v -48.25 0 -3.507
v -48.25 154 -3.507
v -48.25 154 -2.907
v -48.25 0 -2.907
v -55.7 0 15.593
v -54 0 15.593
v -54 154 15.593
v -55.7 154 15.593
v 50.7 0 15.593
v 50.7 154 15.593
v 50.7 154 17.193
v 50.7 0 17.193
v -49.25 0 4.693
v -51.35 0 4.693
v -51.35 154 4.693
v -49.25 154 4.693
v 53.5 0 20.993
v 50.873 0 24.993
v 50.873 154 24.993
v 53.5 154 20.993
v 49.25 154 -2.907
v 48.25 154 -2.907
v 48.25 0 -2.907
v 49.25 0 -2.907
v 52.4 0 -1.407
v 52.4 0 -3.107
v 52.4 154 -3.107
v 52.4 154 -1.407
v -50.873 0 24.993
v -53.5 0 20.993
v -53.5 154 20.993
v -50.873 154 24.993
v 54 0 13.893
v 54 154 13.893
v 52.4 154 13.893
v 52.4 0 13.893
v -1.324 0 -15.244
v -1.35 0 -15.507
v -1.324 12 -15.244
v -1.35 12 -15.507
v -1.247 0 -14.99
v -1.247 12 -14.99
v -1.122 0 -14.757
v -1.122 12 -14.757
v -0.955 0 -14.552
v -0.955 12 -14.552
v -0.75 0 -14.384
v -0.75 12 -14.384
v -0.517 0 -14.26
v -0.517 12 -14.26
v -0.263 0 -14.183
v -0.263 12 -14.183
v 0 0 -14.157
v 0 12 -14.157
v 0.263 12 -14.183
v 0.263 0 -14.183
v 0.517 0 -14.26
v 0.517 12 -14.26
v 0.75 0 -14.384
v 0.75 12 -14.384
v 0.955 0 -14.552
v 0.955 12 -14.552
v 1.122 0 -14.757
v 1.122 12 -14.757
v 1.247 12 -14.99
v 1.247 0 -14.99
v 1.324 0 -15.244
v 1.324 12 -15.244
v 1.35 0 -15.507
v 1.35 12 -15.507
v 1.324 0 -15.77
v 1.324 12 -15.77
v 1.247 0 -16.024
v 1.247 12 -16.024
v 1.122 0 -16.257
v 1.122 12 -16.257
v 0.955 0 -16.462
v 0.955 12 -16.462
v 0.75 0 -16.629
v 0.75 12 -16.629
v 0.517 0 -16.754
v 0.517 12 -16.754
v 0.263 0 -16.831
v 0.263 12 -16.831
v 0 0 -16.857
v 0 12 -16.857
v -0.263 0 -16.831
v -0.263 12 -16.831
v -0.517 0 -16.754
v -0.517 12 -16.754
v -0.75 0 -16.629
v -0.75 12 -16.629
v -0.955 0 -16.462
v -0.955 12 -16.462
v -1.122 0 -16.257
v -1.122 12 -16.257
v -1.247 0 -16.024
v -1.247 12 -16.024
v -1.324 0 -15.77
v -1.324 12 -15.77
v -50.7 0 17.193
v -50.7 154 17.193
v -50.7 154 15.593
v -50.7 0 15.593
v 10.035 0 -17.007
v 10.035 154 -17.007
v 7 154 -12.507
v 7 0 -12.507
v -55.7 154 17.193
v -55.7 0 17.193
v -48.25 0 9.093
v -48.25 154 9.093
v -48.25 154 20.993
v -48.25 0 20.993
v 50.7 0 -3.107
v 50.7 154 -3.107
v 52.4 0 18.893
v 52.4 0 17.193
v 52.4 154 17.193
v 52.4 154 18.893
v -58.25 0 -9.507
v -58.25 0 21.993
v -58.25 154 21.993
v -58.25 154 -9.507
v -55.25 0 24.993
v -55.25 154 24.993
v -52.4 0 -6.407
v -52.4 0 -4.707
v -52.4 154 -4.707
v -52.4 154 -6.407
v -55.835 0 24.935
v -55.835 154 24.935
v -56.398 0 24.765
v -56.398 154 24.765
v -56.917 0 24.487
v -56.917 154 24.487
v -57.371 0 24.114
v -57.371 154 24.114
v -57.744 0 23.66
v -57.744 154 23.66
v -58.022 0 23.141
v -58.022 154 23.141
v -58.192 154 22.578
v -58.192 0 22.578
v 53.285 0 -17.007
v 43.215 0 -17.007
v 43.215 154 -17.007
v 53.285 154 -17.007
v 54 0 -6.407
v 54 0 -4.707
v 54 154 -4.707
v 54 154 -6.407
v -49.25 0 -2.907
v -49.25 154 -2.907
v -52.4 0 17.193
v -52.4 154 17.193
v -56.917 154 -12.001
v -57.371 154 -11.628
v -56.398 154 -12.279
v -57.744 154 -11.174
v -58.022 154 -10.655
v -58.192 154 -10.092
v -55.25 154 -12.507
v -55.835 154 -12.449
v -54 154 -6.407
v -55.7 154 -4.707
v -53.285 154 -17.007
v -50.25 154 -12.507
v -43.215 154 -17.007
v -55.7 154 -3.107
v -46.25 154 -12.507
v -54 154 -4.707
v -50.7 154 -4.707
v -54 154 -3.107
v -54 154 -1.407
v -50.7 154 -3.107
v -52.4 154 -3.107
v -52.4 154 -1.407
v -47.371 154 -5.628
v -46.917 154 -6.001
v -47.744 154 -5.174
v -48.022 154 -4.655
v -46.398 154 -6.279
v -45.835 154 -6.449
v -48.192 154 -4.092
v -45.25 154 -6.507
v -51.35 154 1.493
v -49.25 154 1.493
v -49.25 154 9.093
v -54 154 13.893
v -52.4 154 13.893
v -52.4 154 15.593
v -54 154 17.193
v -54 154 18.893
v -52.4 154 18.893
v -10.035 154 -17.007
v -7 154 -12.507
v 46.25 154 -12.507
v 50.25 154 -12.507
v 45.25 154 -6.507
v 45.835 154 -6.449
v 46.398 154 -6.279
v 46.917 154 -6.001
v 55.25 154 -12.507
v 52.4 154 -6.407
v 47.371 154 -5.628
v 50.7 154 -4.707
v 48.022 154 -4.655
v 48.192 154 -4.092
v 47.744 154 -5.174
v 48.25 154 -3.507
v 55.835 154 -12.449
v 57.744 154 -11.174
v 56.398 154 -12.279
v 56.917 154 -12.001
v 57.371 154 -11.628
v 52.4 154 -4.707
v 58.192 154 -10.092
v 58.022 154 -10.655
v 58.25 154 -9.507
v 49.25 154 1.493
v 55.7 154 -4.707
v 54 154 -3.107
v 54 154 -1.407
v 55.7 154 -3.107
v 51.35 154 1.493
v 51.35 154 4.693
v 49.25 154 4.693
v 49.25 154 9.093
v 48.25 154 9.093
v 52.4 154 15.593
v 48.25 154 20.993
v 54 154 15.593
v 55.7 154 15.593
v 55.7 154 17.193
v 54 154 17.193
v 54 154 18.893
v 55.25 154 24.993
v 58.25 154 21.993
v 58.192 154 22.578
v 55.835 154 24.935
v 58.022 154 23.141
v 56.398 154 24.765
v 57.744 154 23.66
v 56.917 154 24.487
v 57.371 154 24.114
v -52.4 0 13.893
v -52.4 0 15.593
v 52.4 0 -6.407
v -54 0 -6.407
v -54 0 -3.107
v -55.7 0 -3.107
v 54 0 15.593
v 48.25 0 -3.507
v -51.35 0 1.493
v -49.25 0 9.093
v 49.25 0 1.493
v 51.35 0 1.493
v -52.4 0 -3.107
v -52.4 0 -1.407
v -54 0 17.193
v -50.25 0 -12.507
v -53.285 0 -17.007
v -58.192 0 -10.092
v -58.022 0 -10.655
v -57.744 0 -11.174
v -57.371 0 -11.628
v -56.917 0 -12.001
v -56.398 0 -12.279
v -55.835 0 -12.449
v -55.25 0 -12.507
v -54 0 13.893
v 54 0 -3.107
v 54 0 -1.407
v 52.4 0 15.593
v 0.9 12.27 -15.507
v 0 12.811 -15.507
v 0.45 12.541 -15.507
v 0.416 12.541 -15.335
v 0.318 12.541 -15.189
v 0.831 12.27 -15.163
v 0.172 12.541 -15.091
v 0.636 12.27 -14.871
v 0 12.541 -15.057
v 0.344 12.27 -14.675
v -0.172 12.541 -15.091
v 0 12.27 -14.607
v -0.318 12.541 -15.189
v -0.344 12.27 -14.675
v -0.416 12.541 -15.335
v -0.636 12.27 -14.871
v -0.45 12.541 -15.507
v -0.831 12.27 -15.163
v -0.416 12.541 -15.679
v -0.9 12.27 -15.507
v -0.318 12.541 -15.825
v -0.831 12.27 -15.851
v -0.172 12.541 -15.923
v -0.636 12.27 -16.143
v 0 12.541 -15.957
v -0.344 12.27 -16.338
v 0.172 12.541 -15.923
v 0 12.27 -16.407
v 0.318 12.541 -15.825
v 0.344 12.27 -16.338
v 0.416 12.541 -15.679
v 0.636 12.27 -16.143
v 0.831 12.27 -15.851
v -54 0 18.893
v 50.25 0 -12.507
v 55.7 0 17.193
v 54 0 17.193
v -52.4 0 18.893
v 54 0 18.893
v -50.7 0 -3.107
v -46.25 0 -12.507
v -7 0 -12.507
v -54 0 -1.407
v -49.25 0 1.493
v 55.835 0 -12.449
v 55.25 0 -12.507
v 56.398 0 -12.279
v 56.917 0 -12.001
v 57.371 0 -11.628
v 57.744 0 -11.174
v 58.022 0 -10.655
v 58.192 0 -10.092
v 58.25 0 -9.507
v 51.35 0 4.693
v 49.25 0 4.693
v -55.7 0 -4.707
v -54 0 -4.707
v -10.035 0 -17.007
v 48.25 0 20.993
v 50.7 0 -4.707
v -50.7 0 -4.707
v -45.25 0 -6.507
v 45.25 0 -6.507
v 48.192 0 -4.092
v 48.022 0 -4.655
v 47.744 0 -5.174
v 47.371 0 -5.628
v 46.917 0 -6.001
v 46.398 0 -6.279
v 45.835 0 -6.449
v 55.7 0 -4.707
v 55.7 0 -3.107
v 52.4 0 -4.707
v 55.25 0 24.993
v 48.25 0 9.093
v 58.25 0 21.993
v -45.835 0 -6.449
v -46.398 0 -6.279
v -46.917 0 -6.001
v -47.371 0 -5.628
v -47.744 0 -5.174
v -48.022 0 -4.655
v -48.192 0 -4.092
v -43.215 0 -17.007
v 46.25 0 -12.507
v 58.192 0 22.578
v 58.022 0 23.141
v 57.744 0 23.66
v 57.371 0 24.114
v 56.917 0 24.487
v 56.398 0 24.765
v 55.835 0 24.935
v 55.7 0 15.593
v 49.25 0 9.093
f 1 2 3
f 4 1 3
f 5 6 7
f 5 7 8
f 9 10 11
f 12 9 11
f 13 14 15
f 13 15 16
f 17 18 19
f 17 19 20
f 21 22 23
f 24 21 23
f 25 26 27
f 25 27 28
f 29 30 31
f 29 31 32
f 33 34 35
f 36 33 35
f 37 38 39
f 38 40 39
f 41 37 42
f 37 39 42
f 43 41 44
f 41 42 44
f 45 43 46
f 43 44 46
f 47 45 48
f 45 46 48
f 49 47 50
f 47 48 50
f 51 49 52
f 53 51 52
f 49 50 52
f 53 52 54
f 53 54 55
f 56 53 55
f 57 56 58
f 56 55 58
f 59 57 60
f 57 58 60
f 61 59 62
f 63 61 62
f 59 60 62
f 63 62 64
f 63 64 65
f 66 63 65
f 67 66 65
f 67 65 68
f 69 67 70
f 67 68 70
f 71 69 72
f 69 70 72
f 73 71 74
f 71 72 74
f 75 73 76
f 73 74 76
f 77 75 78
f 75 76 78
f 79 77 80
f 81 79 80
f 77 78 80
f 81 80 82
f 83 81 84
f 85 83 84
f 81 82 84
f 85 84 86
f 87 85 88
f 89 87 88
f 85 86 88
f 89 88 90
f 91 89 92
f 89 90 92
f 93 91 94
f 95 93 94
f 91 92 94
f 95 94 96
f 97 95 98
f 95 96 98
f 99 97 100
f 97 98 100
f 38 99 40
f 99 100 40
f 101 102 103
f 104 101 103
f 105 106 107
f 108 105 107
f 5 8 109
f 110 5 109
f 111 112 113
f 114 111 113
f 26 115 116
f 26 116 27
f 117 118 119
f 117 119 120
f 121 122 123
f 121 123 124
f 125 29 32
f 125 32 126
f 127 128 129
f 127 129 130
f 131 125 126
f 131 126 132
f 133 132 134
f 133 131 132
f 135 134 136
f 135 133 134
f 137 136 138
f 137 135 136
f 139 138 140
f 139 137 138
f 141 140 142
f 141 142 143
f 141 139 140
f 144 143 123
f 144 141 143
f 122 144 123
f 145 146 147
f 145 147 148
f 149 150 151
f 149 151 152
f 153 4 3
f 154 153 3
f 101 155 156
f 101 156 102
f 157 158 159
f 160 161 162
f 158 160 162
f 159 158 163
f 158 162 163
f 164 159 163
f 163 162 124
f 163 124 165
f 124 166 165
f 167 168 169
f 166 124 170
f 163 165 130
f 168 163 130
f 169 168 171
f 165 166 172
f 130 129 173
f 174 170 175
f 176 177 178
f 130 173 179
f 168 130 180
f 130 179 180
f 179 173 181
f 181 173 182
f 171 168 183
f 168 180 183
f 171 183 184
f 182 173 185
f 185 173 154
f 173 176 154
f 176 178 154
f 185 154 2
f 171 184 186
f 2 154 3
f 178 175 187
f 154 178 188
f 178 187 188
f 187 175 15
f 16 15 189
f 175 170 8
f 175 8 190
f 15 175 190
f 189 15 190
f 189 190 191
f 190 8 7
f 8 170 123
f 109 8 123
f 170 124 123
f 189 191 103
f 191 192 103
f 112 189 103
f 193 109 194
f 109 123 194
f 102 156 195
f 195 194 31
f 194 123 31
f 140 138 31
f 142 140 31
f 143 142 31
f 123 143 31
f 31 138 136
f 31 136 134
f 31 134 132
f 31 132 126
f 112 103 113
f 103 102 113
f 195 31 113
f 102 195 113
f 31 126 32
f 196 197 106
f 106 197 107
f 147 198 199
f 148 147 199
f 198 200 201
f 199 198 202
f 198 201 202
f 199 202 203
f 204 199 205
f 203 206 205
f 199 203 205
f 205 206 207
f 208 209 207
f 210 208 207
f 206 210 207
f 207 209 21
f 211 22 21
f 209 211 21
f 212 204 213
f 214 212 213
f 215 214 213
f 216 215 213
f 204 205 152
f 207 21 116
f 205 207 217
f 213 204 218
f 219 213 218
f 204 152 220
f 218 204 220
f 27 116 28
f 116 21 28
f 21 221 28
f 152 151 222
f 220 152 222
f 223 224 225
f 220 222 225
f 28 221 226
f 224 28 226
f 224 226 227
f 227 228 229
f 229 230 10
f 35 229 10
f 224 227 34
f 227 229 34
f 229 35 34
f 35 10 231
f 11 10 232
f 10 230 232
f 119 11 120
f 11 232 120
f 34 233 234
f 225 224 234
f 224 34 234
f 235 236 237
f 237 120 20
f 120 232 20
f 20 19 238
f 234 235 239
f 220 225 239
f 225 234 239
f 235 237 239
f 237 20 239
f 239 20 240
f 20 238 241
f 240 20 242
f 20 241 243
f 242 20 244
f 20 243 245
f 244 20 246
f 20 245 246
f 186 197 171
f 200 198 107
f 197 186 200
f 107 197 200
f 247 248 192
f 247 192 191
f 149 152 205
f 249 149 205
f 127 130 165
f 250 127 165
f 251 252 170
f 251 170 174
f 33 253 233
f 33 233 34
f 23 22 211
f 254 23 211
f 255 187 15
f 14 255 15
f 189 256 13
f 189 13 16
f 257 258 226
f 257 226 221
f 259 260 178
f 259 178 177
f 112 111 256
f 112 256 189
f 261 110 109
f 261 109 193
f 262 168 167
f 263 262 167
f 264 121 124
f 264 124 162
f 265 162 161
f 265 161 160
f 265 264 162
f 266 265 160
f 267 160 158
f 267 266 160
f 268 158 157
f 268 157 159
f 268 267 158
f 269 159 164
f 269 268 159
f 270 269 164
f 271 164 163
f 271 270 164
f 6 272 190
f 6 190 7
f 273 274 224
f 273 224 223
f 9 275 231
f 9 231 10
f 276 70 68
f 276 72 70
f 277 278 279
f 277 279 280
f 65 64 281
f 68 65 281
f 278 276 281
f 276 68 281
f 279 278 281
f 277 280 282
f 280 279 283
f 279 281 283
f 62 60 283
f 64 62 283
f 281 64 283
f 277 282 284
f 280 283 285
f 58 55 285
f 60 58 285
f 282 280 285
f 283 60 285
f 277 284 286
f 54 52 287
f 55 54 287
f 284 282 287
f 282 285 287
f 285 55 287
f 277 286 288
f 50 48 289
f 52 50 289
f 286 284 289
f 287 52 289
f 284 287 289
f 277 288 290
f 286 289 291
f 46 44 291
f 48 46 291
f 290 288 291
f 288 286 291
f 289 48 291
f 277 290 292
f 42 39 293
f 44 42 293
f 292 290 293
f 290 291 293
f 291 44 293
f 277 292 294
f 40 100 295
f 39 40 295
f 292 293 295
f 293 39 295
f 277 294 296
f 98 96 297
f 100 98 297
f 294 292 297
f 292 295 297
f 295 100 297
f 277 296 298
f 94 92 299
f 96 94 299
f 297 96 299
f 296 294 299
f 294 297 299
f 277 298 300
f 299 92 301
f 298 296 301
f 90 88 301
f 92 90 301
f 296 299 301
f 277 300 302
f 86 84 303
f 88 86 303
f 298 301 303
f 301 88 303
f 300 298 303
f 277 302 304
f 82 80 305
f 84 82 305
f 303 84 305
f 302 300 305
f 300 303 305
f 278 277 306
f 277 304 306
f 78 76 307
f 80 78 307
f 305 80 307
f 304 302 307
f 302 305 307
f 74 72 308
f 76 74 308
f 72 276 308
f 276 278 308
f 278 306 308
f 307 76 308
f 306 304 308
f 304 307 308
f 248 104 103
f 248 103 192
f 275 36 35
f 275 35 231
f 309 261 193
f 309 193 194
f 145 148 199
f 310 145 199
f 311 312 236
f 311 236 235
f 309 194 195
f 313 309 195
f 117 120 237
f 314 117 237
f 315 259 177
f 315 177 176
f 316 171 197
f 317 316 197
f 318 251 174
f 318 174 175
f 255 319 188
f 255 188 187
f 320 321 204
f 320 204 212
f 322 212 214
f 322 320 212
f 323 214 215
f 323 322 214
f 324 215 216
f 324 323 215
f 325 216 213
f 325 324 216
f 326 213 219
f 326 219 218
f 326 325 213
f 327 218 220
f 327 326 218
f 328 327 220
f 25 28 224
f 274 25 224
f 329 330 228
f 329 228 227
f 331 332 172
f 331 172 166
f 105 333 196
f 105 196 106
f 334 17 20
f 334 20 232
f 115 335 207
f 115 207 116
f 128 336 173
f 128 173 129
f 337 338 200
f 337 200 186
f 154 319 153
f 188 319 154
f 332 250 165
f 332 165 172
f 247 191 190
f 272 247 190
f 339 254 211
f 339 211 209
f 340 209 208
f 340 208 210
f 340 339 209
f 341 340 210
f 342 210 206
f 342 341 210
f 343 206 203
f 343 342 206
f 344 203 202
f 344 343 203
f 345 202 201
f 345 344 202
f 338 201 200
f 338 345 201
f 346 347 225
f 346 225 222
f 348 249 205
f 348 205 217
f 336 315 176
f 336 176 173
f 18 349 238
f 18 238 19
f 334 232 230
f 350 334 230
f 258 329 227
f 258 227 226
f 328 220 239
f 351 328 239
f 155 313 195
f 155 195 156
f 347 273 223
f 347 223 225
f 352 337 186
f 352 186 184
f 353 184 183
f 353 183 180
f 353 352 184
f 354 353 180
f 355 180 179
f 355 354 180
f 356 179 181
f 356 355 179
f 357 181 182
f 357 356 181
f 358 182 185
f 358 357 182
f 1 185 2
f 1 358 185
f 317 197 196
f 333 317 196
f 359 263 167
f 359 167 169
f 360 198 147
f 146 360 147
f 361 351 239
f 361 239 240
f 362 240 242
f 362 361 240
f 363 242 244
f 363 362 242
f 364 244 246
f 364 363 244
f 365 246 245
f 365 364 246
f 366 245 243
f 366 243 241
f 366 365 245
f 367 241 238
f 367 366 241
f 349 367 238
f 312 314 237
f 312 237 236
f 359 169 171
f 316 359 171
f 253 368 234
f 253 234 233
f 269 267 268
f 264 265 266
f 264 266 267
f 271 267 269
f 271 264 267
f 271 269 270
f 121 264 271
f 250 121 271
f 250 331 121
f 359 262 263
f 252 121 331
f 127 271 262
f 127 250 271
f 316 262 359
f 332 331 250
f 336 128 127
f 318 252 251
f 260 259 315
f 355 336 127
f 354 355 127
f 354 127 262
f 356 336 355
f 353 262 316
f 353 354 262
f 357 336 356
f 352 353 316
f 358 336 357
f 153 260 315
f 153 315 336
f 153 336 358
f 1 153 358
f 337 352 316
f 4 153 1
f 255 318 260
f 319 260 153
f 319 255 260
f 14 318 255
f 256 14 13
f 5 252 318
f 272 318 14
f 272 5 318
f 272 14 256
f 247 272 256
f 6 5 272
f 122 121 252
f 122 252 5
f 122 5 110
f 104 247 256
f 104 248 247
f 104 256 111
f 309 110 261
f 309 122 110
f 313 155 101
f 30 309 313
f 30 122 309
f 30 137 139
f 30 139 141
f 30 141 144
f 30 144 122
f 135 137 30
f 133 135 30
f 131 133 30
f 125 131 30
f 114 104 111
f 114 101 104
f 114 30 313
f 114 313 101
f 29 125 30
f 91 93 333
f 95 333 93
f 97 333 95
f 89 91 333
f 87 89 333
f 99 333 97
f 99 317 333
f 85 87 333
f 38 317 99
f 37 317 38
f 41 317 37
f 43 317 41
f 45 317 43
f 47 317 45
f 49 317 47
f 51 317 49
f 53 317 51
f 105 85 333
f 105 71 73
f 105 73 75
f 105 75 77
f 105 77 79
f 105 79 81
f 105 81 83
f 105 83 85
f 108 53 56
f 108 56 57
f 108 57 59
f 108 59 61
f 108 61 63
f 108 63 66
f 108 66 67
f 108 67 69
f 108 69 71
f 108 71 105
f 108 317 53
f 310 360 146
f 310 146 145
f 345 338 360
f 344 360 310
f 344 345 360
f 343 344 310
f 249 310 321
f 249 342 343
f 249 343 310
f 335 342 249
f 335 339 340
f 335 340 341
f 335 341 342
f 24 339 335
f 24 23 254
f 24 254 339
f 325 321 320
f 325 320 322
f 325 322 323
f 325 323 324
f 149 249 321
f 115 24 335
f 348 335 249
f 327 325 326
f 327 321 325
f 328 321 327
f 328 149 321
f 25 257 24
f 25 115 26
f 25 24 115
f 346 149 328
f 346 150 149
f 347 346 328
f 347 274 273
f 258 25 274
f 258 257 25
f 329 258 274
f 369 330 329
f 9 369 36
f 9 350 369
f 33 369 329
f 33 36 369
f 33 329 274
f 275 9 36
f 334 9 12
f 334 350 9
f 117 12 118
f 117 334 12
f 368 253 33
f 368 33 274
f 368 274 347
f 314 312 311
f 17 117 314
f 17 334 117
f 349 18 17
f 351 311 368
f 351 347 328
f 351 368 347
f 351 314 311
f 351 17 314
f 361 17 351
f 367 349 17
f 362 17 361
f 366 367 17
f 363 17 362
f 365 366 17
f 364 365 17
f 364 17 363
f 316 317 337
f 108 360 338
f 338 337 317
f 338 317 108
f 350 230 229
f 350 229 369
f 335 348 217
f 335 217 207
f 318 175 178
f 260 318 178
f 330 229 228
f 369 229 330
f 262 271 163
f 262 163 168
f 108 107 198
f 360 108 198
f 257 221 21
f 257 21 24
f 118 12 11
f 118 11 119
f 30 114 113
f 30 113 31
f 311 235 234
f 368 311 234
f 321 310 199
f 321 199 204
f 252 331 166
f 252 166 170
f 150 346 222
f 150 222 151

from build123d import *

# Parameters (mm, degrees)
F1_DEPTH = 154
F3_D     = 2.7
F3_DEPTH = 12
F3_TIP   = 0.8111618357
F4_W     = 154
F4_H     = 12
F5_DEPTH = 1
F6_W     = 154
F6_H     = 12
F7_DEPTH = 1


with BuildPart() as f1:
    # F0 (on Front) → F1 (new body)
    with BuildSketch(Plane.XZ):
        with BuildLine():
            Line((-10.0352883258, -17.0069661875), (0, -17.0069661875))
            Line((0, -17.0069661875), (10.0352883258, -17.0069661875))
            Line((10.0352883258, -17.0069661875), (7, -12.5069661875))
            Line((7, -12.5069661875), (46.25, -12.5069661875))
            Line((46.25, -12.5069661875), (43.2147116742, -17.0069661875))
            Line((43.2147116742, -17.0069661875), (53.2852883258, -17.0069661875))
            Line((53.2852883258, -17.0069661875), (50.25, -12.5069661875))
            Line((50.25, -12.5069661875), (55.25, -12.5069661875))
            ThreePointArc((55.25, -12.5069661875), (57.3713203436, -11.6282865311), (58.25, -9.5069661875))
            Line((58.25, -9.5069661875), (58.25, 21.9930338125))
            ThreePointArc((58.25, 21.9930338125), (57.3713203436, 24.114354156), (55.25, 24.9930338125))
            Line((55.25, 24.9930338125), (50.8726710718, 24.9930338125))
            Line((50.8726710718, 24.9930338125), (53.5, 20.9930338125))
            Line((53.5, 20.9930338125), (48.25, 20.9930338125))
            Line((48.25, 20.9930338125), (48.25, 4.6930338125))
            Line((48.25, 4.6930338125), (51.35, 4.6930338125))
            Line((51.35, 4.6930338125), (51.35, 1.4930338125))
            Line((51.35, 1.4930338125), (48.25, 1.4930338125))
            Line((48.25, 1.4930338125), (48.25, -3.5069661875))
            ThreePointArc((48.25, -3.5069661875), (47.3713203436, -5.6282865311), (45.25, -6.5069661875))
            Line((45.25, -6.5069661875), (0, -6.5069661875))
            Line((0, -6.5069661875), (-45.25, -6.5069661875))
            ThreePointArc((-45.25, -6.5069661875), (-47.3713203436, -5.6282865311), (-48.25, -3.5069661875))
            Line((-48.25, -3.5069661875), (-48.25, 1.4930338125))
            Line((-48.25, 1.4930338125), (-51.35, 1.4930338125))
            Line((-51.35, 1.4930338125), (-51.35, 4.6930338125))
            Line((-51.35, 4.6930338125), (-48.25, 4.6930338125))
            Line((-48.25, 4.6930338125), (-48.25, 20.9930338125))
            Line((-48.25, 20.9930338125), (-53.5, 20.9930338125))
            Line((-53.5, 20.9930338125), (-50.8726710718, 24.9930338125))
            Line((-50.8726710718, 24.9930338125), (-55.25, 24.9930338125))
            ThreePointArc((-55.25, 24.9930338125), (-57.3713203436, 24.114354156), (-58.25, 21.9930338125))
            Line((-58.25, 21.9930338125), (-58.25, -9.5069661875))
            ThreePointArc((-58.25, -9.5069661875), (-57.3713203436, -11.6282865311), (-55.25, -12.5069661875))
            Line((-55.25, -12.5069661875), (-50.25, -12.5069661875))
            Line((-50.25, -12.5069661875), (-53.2852883258, -17.0069661875))
            Line((-53.2852883258, -17.0069661875), (-43.2147116742, -17.0069661875))
            Line((-43.2147116742, -17.0069661875), (-46.25, -12.5069661875))
            Line((-46.25, -12.5069661875), (-7, -12.5069661875))
            Line((-7, -12.5069661875), (-10.0352883258, -17.0069661875))
        make_face()
        Polygon((-54, -3.1069661875), (-54, -1.4069661875), (-52.4, -1.4069661875), (-52.4, -3.1069661875), (-50.7, -3.1069661875), (-50.7, -4.7069661875), (-52.4, -4.7069661875), (-52.4, -6.4069661875), (-54, -6.4069661875), (-54, -4.7069661875), (-55.7, -4.7069661875), (-55.7, -3.1069661875), align=None, mode=Mode.SUBTRACT)
        Polygon((52.4, -1.4069661875), (54, -1.4069661875), (54, -3.1069661875), (55.7, -3.1069661875), (55.7, -4.7069661875), (54, -4.7069661875), (54, -6.4069661875), (52.4, -6.4069661875), (52.4, -4.7069661875), (50.7, -4.7069661875), (50.7, -3.1069661875), (52.4, -3.1069661875), align=None, mode=Mode.SUBTRACT)
        Polygon((-55.7, 15.5930338125), (-55.7, 17.1930338125), (-54, 17.1930338125), (-54, 18.8930338125), (-52.4, 18.8930338125), (-52.4, 17.1930338125), (-50.7, 17.1930338125), (-50.7, 15.5930338125), (-52.4, 15.5930338125), (-52.4, 13.8930338125), (-54, 13.8930338125), (-54, 15.5930338125), align=None, mode=Mode.SUBTRACT)
        Polygon((54, 18.8930338125), (54, 17.1930338125), (55.7, 17.1930338125), (55.7, 15.5930338125), (54, 15.5930338125), (54, 13.8930338125), (52.4, 13.8930338125), (52.4, 15.5930338125), (50.7, 15.5930338125), (50.7, 17.1930338125), (52.4, 17.1930338125), (52.4, 18.8930338125), align=None, mode=Mode.SUBTRACT)
    extrude(amount=-F1_DEPTH)

    # F3
    with Locations(Plane.XZ):
        with Locations((0, -15.5069661875)):
            Hole(F3_D / 2, depth=F3_DEPTH)
            with Locations((0, 0, -(F3_DEPTH + F3_TIP / 2))):  # 118° drill point
                Cone(0, F3_D / 2, F3_TIP, mode=Mode.SUBTRACT)

    # F4 (on face) → F5 (cut)
    with BuildSketch(Plane.YZ.offset(-48.25)):
        with Locations((77, 3.0930338125)):
            Rectangle(F4_W, F4_H)
    extrude(amount=-F5_DEPTH, mode=Mode.SUBTRACT)

    # F6 (on face) → F7 (cut)
    with BuildSketch(Plane(origin=(48.25, 0, 0), x_dir=(0, -1, 0), z_dir=(-1, 0, 0))):
        with Locations((-77, 3.0930338125)):
            Rectangle(F6_W, F6_H)
    extrude(amount=-F7_DEPTH, mode=Mode.SUBTRACT)


solid = f1.part
